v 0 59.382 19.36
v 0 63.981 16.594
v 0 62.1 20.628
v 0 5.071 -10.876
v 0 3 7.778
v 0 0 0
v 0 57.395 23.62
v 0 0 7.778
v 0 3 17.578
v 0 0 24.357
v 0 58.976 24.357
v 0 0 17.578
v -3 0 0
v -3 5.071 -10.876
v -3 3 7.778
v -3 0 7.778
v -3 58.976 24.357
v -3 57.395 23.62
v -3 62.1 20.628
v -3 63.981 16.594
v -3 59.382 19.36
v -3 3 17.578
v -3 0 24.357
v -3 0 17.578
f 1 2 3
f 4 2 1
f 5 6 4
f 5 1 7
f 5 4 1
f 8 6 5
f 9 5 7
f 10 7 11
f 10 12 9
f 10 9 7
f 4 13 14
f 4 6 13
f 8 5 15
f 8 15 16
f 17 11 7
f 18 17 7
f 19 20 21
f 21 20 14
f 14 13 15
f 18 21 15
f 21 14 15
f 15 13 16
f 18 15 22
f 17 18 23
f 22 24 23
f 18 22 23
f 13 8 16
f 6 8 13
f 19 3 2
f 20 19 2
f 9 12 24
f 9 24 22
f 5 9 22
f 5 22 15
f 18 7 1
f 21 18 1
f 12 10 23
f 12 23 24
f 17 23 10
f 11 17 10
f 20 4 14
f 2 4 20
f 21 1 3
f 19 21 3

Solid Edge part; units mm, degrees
sketch "Sketch1" plane through (0, 0, 0) normal (1, 0, 0) x (0, 1, 0)
  line L0 (59.8954, 25.3571) -> (0, 25.3571)
  line L1 (0, 25.3571) -> (0, 17.5785)
  line L2 (0, 17.5785) -> (3, 17.5785)
  line L3 (3, 17.5785) -> (3, 7.7785)
  line L4 (3, 7.7785) -> (0, 7.7785)
  line L5 (0, 7.7785) -> (0, 0)
  line L6 (0, 0) -> (5.0714, -10.8757)
  line L7 (5.0714, -10.8757) -> (63.9814, 16.5945)
  line L8 (62.1005, 20.6281) -> (63.9814, 16.5945)
  line L9 (59.3816, 19.3602) -> (62.1005, 20.6281)
  line L10 (57.3953, 23.6198) -> (59.3816, 19.3602)
  line L11 (60.1142, 24.8877) -> (57.3953, 23.6198)
  line L12 (59.8954, 25.3571) -> (60.1142, 24.8877)
  dimension "D1" = 9.8
  dimension "D2" = 3
  dimension "D3" = 65
  dimension "D4" = 12
  dimension "D5" = 25.3571
  dimension "D6" = 4.7
  dimension "D7" = 4.4505
extrude "Protrusion1" add sketch "Sketch1" against normal blind 3
sketch "Sketch2" plane through (0, 0, 0) normal (0, -1, 0) x (1, 0, 0)
  line L0 (-8.2565, 24.3571) -> (6.8913, 24.3571)
  dimension "D1" = 1
extrude "Cutout1" cut sketch "Sketch2" against normal through all material side at (-0.6826, 0, 24.4071)
properties material "Acier"
